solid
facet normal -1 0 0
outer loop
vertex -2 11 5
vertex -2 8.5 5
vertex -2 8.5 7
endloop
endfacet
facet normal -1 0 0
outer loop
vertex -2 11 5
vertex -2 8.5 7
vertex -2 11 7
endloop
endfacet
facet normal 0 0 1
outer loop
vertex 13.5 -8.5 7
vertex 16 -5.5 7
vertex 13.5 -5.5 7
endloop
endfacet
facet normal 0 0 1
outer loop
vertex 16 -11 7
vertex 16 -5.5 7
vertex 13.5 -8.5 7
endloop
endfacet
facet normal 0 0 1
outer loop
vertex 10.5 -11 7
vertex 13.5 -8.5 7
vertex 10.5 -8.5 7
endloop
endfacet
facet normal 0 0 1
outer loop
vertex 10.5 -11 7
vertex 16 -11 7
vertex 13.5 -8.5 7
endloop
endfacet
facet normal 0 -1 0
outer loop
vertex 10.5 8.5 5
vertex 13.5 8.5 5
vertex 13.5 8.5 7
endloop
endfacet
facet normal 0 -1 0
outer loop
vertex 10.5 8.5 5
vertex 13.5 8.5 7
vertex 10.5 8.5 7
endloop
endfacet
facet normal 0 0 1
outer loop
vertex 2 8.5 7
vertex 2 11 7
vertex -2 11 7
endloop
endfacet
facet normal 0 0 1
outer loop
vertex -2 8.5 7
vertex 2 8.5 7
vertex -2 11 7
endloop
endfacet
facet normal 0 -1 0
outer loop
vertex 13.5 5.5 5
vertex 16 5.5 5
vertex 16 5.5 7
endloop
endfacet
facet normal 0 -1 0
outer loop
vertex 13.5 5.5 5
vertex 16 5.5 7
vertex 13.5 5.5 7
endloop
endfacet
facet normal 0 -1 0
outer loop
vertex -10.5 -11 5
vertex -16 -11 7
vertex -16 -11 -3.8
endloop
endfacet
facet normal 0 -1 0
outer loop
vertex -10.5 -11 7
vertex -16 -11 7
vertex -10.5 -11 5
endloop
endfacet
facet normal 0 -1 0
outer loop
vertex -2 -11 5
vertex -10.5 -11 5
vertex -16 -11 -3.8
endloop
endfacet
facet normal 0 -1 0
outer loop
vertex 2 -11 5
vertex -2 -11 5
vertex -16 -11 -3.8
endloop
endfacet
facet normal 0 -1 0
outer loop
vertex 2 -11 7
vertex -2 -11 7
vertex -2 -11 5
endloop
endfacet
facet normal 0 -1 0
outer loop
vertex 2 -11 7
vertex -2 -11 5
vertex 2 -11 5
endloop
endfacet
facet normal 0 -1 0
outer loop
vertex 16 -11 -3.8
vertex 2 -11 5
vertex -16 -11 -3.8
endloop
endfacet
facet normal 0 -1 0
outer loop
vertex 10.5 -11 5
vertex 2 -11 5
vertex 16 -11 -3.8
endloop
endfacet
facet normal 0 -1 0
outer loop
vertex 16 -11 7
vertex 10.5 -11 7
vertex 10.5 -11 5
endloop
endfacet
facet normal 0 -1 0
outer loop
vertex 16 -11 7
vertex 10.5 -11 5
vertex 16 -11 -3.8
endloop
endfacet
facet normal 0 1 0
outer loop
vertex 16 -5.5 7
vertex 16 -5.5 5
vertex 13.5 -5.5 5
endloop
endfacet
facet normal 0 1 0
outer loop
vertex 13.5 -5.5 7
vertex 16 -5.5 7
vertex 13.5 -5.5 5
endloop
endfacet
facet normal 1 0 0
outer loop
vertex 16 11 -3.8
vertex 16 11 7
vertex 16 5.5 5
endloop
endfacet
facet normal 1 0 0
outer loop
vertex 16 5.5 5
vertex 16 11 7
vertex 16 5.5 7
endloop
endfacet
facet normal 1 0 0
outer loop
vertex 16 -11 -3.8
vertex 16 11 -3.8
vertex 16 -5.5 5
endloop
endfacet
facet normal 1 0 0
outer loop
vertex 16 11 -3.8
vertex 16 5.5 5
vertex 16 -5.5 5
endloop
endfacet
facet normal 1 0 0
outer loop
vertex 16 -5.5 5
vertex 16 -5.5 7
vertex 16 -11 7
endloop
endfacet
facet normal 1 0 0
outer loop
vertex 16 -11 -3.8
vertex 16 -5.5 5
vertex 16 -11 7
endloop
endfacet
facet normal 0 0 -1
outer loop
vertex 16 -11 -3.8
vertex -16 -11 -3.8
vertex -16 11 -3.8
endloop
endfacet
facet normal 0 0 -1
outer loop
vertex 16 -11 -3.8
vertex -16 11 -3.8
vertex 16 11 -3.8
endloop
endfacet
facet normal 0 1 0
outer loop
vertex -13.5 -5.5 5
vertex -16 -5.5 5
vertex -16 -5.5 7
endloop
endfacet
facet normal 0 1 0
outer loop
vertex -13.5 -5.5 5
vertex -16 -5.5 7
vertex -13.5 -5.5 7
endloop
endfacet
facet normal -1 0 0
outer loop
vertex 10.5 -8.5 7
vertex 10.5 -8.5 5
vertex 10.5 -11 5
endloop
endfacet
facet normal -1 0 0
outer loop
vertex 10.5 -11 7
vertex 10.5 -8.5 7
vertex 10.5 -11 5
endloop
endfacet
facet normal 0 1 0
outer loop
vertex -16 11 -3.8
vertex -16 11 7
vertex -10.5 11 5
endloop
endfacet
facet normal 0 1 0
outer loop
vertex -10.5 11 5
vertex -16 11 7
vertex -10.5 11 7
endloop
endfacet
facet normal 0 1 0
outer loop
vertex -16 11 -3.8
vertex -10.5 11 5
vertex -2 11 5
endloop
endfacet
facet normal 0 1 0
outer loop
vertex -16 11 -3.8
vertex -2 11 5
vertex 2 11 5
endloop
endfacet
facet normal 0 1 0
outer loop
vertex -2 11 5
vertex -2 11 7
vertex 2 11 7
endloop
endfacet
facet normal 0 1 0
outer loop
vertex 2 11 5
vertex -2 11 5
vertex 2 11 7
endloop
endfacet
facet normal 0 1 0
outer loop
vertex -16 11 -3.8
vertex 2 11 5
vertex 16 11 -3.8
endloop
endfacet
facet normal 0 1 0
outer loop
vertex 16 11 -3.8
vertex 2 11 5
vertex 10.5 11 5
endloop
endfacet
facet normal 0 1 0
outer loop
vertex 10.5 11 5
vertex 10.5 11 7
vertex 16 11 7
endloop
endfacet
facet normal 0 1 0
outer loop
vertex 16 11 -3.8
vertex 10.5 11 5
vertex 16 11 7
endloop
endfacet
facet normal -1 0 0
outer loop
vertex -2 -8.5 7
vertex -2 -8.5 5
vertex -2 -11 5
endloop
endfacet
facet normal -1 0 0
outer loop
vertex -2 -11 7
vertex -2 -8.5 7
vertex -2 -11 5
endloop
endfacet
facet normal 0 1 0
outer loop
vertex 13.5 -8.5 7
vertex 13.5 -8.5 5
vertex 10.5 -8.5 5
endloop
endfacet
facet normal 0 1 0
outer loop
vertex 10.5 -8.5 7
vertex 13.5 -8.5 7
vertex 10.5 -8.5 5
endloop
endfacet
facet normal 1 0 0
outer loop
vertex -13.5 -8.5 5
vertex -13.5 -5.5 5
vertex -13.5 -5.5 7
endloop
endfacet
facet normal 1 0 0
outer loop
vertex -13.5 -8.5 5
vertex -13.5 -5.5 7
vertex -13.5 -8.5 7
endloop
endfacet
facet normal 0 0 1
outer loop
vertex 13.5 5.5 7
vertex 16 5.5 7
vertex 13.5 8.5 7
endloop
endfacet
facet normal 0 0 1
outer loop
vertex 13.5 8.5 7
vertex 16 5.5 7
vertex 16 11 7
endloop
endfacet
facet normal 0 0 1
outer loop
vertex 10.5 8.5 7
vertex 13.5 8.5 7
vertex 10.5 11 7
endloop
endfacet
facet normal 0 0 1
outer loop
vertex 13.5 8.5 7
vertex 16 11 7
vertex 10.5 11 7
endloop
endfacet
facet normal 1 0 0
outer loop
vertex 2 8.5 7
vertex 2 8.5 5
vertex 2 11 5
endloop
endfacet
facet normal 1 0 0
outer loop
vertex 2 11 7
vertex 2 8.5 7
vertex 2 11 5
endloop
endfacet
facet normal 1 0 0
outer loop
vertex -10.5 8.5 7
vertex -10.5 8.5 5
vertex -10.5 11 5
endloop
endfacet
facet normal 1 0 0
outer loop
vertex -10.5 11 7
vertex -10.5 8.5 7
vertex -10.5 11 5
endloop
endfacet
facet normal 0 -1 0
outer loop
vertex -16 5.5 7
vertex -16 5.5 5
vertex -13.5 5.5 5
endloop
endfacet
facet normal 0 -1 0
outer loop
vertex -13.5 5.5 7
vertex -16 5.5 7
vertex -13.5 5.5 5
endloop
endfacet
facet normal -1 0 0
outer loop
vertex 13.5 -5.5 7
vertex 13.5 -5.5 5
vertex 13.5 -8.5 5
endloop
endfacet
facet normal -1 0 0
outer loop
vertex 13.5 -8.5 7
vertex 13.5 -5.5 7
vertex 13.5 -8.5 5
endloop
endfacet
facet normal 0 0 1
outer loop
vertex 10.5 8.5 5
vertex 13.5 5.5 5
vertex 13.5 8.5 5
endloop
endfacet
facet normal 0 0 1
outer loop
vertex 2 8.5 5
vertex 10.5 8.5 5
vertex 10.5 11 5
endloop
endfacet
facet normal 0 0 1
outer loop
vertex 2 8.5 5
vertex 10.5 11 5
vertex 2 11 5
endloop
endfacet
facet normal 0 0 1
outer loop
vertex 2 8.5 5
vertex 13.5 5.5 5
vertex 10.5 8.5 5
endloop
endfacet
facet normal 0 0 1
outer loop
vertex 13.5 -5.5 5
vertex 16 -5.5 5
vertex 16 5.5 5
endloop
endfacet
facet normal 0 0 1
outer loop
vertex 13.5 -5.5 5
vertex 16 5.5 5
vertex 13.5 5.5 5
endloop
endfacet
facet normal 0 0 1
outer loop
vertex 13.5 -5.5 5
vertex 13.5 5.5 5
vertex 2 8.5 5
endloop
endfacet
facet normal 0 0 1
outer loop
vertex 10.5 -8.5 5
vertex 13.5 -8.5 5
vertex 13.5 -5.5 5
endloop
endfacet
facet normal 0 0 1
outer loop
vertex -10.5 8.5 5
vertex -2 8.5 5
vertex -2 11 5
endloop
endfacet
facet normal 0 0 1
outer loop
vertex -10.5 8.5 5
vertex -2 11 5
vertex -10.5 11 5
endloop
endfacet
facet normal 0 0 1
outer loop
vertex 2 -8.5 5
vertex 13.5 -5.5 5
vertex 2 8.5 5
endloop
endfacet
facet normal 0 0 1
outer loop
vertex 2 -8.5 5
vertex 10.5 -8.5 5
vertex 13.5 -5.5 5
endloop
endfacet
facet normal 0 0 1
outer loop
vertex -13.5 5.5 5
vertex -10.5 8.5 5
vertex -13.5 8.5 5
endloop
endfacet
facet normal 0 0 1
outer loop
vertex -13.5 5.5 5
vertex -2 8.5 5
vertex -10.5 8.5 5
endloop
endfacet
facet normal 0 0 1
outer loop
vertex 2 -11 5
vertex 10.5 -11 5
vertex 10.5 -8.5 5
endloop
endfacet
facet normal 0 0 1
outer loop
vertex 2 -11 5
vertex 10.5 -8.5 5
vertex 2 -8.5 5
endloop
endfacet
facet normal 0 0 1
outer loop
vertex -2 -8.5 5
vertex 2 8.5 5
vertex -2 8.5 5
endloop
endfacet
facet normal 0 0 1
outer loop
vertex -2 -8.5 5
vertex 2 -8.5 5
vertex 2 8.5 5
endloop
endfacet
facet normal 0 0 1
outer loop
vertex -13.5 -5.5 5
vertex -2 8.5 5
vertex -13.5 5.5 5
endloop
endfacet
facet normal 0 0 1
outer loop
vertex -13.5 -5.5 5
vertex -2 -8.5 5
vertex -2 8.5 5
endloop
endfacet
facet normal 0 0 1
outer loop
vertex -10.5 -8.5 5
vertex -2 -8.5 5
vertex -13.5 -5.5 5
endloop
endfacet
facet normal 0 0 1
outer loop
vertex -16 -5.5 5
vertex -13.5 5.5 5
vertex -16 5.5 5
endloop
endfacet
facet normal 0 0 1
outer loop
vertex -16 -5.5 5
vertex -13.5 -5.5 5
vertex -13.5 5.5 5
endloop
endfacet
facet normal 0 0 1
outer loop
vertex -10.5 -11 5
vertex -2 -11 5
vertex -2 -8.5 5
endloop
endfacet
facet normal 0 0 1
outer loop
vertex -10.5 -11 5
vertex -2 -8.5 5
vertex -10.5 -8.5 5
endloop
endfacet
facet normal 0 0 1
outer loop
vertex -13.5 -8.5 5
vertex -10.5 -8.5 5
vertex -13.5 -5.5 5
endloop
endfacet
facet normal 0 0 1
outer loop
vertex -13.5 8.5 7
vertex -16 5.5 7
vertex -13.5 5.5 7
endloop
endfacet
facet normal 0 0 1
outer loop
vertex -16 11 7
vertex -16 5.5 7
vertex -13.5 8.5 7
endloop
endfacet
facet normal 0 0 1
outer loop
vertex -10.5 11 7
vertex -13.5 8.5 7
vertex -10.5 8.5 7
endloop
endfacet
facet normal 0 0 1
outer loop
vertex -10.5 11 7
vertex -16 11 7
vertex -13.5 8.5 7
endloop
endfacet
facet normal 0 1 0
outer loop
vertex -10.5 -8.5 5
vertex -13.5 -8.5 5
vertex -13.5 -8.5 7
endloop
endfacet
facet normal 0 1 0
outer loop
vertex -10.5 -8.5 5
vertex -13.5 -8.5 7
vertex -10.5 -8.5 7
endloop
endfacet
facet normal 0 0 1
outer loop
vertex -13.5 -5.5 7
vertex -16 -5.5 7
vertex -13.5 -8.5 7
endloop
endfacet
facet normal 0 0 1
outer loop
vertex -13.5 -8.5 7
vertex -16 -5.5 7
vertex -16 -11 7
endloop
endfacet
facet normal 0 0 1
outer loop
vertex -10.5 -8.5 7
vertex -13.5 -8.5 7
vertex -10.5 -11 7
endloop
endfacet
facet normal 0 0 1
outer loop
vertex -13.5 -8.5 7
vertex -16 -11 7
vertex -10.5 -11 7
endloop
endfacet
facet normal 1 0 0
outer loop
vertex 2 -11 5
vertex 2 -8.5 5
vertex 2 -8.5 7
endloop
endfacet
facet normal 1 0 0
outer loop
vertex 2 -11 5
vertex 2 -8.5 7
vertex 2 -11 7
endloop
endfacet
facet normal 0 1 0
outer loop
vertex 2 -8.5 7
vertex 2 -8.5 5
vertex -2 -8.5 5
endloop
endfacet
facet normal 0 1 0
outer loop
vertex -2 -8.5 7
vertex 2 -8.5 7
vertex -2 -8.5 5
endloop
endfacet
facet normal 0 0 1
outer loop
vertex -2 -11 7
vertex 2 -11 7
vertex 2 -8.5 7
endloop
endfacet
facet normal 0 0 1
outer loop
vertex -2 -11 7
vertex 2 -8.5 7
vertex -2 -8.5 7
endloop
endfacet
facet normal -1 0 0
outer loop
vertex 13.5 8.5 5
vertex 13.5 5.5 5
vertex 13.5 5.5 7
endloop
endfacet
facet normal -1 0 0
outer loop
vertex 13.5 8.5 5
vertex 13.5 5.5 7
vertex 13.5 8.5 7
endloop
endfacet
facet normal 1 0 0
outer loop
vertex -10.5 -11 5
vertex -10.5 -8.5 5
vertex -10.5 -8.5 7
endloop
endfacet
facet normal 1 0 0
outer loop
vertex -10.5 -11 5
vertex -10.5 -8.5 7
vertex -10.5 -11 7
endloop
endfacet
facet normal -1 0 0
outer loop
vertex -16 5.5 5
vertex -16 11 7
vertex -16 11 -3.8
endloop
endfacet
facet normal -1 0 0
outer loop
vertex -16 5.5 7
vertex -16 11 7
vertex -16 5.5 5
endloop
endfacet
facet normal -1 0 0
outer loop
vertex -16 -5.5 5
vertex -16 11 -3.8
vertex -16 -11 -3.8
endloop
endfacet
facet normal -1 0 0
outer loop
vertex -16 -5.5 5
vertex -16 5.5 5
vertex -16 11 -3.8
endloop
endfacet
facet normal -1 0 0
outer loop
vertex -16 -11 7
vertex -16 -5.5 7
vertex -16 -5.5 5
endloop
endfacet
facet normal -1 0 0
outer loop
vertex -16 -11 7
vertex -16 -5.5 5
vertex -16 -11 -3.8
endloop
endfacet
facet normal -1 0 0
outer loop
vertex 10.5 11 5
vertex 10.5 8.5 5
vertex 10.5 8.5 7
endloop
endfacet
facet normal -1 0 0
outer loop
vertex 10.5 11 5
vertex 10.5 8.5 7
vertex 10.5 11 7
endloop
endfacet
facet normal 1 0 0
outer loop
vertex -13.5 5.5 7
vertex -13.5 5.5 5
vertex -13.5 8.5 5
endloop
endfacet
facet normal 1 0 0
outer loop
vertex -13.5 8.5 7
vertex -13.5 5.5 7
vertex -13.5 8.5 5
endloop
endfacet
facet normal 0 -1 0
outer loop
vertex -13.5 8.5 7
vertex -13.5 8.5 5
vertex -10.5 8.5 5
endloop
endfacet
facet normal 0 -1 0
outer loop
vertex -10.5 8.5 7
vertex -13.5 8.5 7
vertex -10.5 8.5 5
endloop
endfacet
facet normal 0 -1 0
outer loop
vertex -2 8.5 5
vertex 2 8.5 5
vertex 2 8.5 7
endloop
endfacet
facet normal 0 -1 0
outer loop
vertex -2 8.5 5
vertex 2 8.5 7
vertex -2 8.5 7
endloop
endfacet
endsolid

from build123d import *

# Parameters (mm, degrees)
F0_W      = 16
F0_H      = 11
F1_DEPTH  = 5
F2_W      = 2.5
F2_H      = 2.5
F2_W_2    = 3
F2_H_2    = 3
F2_W_3    = 2
F3_DEPTH  = 2
F5_FACE_W = 32
F5_FACE_H = 22
F6_DEPTH  = 3.8


with BuildPart() as f1:
    # F0 (on Top) → F1 (new body)
    with BuildSketch(Plane.XY):
        with Locations((-8, 5.5)):
            Rectangle(F0_W, F0_H)
    extrude(amount=F1_DEPTH)

    # F2 (on face) → F3 (join)
    with BuildSketch(Plane.XY.offset(5)):
        with Locations((-14.75, 9.75)):
            Rectangle(F2_W, F2_H)
        with Locations((-12, 9.75)):
            Rectangle(F2_W_2, F2_H)
        with Locations((-14.75, 7)):
            Rectangle(F2_W, F2_H_2)
        with Locations((-1, 9.75)):
            Rectangle(F2_W_3, F2_H)
    extrude(amount=F3_DEPTH)

    # F4: F1 across plane


with BuildPart() as f1_1:
    add(f1.part)
    add(f1.part.mirror(Plane.XZ))

    # F5: F1 across plane


with BuildPart() as f1_2:
    add(f1_1.part)
    add(f1_1.part.mirror(Plane.YZ))

    # F5_face (on face) → F6 (join)
    with BuildSketch(Plane(origin=(0, 0, 0), x_dir=(1, 0, 0), z_dir=(0, 0, -1))):
        Rectangle(F5_FACE_W, F5_FACE_H)
    extrude(amount=F6_DEPTH)


solid = f1_2.part
